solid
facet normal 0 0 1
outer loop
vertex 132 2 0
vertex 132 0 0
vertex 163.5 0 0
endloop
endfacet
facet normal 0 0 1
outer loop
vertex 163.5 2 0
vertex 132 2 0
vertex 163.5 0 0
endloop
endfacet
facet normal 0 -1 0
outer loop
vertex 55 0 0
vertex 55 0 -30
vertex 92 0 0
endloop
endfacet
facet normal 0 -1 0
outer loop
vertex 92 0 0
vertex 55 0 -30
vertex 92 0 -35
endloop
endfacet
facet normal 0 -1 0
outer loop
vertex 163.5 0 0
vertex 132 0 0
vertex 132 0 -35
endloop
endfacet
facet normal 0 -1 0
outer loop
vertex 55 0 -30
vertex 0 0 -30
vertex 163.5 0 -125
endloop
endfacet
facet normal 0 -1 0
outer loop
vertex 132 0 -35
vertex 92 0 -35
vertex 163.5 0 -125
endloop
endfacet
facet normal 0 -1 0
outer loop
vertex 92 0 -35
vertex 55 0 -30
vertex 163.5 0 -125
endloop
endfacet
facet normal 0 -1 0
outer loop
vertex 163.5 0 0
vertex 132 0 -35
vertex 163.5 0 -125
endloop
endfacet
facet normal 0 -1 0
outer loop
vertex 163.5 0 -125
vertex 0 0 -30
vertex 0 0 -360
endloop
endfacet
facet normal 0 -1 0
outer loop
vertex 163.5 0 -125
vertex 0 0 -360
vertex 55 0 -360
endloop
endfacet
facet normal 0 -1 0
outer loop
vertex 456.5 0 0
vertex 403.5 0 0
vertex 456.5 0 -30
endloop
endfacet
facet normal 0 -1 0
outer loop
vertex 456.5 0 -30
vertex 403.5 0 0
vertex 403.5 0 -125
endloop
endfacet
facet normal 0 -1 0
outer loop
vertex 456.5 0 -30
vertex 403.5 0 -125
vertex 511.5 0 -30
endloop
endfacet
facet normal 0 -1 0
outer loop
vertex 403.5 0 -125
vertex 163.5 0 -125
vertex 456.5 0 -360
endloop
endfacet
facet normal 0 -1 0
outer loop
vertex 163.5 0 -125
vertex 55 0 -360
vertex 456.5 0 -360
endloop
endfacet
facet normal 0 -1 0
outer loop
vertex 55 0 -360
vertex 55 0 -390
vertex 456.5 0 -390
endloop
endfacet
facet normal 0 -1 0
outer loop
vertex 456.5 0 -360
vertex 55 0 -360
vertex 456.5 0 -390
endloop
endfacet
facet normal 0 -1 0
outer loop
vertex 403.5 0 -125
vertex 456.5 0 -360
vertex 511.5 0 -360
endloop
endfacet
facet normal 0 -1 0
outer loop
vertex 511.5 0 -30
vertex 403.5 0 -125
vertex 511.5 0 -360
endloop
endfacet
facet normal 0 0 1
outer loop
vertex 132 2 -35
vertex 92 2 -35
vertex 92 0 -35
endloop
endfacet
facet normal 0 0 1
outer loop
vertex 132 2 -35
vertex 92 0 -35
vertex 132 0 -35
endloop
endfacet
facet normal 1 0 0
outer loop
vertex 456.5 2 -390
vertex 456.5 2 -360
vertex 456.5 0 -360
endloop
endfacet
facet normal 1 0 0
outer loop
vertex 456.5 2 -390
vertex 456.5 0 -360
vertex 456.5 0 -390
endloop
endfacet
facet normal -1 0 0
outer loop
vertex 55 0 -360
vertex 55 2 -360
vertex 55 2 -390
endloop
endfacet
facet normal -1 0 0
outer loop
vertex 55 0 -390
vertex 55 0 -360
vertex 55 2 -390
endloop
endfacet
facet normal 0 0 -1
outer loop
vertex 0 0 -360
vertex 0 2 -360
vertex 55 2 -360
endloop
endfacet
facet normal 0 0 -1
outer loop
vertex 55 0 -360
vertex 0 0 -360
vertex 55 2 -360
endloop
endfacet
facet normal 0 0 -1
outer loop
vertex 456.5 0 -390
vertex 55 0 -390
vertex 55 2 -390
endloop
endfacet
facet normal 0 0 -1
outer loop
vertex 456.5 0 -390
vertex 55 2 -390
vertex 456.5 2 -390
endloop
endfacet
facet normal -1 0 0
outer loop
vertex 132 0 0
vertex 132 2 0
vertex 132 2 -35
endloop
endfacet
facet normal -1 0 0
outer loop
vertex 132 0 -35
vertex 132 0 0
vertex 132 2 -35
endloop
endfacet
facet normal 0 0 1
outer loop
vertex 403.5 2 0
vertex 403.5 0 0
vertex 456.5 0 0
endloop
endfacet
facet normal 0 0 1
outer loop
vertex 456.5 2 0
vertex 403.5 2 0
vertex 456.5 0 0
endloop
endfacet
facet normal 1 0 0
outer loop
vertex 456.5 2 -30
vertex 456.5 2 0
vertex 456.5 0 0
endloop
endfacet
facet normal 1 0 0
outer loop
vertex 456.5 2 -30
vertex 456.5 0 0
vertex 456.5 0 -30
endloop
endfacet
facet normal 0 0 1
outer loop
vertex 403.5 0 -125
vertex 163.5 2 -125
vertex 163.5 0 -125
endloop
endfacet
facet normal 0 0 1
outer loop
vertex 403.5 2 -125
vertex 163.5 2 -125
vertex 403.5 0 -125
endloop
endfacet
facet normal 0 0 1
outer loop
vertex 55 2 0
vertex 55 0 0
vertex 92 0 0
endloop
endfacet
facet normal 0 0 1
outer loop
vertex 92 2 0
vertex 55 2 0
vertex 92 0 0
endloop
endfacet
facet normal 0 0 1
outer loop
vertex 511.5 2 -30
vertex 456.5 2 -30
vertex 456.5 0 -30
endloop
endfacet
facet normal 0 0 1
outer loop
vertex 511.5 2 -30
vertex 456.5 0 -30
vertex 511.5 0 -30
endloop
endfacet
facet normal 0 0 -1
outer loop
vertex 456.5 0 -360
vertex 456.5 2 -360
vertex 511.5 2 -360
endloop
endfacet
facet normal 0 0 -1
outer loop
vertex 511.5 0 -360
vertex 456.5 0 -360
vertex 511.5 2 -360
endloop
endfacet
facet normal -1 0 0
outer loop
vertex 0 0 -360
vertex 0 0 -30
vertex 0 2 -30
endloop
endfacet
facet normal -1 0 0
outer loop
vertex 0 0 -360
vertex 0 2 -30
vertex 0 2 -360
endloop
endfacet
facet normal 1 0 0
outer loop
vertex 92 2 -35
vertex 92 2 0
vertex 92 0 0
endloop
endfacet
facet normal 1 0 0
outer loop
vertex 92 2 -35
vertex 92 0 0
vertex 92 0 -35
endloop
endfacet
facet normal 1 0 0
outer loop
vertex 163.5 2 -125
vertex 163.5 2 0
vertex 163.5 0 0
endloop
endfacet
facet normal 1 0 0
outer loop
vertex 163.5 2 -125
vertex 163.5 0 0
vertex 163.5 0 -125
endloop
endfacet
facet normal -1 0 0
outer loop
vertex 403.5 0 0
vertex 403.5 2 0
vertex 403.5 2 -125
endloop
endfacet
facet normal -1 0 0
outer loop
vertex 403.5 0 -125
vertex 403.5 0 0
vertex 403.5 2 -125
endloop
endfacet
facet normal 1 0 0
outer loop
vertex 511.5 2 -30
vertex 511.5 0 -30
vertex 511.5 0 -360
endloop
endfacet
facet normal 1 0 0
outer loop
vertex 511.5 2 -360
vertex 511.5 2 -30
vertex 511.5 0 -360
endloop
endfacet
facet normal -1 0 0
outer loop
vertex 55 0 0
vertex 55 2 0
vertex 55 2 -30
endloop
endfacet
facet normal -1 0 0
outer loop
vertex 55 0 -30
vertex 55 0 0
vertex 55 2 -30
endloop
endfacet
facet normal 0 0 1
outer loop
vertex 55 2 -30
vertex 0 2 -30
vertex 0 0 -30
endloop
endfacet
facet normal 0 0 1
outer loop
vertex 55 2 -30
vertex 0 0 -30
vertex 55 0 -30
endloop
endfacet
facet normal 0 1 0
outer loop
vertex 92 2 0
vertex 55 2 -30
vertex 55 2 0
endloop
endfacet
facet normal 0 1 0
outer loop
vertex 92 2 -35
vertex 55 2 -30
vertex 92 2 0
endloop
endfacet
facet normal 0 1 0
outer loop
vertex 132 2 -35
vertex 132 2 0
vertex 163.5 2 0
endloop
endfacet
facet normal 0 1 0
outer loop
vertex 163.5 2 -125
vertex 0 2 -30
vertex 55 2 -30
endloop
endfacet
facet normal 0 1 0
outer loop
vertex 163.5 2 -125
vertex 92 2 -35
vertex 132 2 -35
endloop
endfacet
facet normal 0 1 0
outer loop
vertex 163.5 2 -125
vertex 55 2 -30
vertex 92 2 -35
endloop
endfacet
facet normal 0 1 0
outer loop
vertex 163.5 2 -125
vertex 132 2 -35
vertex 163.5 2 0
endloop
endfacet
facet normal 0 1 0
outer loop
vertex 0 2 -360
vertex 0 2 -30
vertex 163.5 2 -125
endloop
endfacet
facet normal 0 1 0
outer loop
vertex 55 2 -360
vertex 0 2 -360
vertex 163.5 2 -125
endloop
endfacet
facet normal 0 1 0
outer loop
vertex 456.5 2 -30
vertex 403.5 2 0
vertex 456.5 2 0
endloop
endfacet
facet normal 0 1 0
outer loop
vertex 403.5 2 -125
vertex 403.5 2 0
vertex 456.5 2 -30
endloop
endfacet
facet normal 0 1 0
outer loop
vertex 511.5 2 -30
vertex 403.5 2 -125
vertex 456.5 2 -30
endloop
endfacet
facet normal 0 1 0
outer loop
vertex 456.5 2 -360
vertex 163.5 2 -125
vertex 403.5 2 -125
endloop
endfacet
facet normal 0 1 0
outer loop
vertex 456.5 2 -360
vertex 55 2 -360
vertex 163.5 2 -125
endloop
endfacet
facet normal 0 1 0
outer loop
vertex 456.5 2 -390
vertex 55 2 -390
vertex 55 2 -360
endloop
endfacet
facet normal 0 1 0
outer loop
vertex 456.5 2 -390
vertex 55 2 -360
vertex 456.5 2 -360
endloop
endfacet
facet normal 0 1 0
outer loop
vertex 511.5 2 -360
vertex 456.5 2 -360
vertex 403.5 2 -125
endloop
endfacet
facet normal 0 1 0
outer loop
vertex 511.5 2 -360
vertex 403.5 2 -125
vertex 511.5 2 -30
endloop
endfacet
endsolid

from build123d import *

# Parameters (mm, degrees)
CROQUIS1_W              = 511.5
CROQUIS1_H              = 390
SALIENTE_EXTRUIR1_DEPTH = 2
CROQUIS3_W              = 55
CROQUIS3_H              = 30
CORTAR_EXTRUIR1_DEPTH   = 2
CROQUIS4_W              = 240
CROQUIS4_H              = 125
CORTAR_EXTRUIR2_DEPTH   = 2
CROQUIS5_W              = 40
CROQUIS5_H              = 35
CORTAR_EXTRUIR3_DEPTH   = 2


with BuildPart() as part:
    # Croquis1 → Saliente-Extruir1 (new body)
    with BuildSketch(Plane(origin=(0, 0, 0), x_dir=(1, 0, 0), z_dir=(0, 1, 0))):
        with Locations((255.75, 195)):
            Rectangle(CROQUIS1_W, CROQUIS1_H)
    extrude(amount=SALIENTE_EXTRUIR1_DEPTH)

    # Croquis3 → Cortar-Extruir1 (cut)
    with BuildSketch(Plane(origin=(0, 2, 0), x_dir=(1, 0, 0), z_dir=(0, 1, 0))):
        with Locations((484, 15)):
            Rectangle(CROQUIS3_W, CROQUIS3_H)
        with Locations((27.5, 15)):
            Rectangle(CROQUIS3_W, CROQUIS3_H)
        with Locations((484, 375)):
            Rectangle(CROQUIS3_W, CROQUIS3_H)
        with Locations((27.5, 375)):
            Rectangle(CROQUIS3_W, CROQUIS3_H)
    extrude(amount=-CORTAR_EXTRUIR1_DEPTH, mode=Mode.SUBTRACT)

    # Croquis4 → Cortar-Extruir2 (cut)
    with BuildSketch(Plane(origin=(0, 2, 0), x_dir=(1, 0, 0), z_dir=(0, 1, 0))):
        with Locations((283.5, 62.5)):
            Rectangle(CROQUIS4_W, CROQUIS4_H)
    extrude(amount=-CORTAR_EXTRUIR2_DEPTH, mode=Mode.SUBTRACT)

    # Croquis5 → Cortar-Extruir3 (cut)
    with BuildSketch(Plane(origin=(0, 2, 0), x_dir=(1, 0, 0), z_dir=(0, 1, 0))):
        with Locations((112, 17.5)):
            Rectangle(CROQUIS5_W, CROQUIS5_H)
    extrude(amount=-CORTAR_EXTRUIR3_DEPTH, mode=Mode.SUBTRACT)


solid = part.part
